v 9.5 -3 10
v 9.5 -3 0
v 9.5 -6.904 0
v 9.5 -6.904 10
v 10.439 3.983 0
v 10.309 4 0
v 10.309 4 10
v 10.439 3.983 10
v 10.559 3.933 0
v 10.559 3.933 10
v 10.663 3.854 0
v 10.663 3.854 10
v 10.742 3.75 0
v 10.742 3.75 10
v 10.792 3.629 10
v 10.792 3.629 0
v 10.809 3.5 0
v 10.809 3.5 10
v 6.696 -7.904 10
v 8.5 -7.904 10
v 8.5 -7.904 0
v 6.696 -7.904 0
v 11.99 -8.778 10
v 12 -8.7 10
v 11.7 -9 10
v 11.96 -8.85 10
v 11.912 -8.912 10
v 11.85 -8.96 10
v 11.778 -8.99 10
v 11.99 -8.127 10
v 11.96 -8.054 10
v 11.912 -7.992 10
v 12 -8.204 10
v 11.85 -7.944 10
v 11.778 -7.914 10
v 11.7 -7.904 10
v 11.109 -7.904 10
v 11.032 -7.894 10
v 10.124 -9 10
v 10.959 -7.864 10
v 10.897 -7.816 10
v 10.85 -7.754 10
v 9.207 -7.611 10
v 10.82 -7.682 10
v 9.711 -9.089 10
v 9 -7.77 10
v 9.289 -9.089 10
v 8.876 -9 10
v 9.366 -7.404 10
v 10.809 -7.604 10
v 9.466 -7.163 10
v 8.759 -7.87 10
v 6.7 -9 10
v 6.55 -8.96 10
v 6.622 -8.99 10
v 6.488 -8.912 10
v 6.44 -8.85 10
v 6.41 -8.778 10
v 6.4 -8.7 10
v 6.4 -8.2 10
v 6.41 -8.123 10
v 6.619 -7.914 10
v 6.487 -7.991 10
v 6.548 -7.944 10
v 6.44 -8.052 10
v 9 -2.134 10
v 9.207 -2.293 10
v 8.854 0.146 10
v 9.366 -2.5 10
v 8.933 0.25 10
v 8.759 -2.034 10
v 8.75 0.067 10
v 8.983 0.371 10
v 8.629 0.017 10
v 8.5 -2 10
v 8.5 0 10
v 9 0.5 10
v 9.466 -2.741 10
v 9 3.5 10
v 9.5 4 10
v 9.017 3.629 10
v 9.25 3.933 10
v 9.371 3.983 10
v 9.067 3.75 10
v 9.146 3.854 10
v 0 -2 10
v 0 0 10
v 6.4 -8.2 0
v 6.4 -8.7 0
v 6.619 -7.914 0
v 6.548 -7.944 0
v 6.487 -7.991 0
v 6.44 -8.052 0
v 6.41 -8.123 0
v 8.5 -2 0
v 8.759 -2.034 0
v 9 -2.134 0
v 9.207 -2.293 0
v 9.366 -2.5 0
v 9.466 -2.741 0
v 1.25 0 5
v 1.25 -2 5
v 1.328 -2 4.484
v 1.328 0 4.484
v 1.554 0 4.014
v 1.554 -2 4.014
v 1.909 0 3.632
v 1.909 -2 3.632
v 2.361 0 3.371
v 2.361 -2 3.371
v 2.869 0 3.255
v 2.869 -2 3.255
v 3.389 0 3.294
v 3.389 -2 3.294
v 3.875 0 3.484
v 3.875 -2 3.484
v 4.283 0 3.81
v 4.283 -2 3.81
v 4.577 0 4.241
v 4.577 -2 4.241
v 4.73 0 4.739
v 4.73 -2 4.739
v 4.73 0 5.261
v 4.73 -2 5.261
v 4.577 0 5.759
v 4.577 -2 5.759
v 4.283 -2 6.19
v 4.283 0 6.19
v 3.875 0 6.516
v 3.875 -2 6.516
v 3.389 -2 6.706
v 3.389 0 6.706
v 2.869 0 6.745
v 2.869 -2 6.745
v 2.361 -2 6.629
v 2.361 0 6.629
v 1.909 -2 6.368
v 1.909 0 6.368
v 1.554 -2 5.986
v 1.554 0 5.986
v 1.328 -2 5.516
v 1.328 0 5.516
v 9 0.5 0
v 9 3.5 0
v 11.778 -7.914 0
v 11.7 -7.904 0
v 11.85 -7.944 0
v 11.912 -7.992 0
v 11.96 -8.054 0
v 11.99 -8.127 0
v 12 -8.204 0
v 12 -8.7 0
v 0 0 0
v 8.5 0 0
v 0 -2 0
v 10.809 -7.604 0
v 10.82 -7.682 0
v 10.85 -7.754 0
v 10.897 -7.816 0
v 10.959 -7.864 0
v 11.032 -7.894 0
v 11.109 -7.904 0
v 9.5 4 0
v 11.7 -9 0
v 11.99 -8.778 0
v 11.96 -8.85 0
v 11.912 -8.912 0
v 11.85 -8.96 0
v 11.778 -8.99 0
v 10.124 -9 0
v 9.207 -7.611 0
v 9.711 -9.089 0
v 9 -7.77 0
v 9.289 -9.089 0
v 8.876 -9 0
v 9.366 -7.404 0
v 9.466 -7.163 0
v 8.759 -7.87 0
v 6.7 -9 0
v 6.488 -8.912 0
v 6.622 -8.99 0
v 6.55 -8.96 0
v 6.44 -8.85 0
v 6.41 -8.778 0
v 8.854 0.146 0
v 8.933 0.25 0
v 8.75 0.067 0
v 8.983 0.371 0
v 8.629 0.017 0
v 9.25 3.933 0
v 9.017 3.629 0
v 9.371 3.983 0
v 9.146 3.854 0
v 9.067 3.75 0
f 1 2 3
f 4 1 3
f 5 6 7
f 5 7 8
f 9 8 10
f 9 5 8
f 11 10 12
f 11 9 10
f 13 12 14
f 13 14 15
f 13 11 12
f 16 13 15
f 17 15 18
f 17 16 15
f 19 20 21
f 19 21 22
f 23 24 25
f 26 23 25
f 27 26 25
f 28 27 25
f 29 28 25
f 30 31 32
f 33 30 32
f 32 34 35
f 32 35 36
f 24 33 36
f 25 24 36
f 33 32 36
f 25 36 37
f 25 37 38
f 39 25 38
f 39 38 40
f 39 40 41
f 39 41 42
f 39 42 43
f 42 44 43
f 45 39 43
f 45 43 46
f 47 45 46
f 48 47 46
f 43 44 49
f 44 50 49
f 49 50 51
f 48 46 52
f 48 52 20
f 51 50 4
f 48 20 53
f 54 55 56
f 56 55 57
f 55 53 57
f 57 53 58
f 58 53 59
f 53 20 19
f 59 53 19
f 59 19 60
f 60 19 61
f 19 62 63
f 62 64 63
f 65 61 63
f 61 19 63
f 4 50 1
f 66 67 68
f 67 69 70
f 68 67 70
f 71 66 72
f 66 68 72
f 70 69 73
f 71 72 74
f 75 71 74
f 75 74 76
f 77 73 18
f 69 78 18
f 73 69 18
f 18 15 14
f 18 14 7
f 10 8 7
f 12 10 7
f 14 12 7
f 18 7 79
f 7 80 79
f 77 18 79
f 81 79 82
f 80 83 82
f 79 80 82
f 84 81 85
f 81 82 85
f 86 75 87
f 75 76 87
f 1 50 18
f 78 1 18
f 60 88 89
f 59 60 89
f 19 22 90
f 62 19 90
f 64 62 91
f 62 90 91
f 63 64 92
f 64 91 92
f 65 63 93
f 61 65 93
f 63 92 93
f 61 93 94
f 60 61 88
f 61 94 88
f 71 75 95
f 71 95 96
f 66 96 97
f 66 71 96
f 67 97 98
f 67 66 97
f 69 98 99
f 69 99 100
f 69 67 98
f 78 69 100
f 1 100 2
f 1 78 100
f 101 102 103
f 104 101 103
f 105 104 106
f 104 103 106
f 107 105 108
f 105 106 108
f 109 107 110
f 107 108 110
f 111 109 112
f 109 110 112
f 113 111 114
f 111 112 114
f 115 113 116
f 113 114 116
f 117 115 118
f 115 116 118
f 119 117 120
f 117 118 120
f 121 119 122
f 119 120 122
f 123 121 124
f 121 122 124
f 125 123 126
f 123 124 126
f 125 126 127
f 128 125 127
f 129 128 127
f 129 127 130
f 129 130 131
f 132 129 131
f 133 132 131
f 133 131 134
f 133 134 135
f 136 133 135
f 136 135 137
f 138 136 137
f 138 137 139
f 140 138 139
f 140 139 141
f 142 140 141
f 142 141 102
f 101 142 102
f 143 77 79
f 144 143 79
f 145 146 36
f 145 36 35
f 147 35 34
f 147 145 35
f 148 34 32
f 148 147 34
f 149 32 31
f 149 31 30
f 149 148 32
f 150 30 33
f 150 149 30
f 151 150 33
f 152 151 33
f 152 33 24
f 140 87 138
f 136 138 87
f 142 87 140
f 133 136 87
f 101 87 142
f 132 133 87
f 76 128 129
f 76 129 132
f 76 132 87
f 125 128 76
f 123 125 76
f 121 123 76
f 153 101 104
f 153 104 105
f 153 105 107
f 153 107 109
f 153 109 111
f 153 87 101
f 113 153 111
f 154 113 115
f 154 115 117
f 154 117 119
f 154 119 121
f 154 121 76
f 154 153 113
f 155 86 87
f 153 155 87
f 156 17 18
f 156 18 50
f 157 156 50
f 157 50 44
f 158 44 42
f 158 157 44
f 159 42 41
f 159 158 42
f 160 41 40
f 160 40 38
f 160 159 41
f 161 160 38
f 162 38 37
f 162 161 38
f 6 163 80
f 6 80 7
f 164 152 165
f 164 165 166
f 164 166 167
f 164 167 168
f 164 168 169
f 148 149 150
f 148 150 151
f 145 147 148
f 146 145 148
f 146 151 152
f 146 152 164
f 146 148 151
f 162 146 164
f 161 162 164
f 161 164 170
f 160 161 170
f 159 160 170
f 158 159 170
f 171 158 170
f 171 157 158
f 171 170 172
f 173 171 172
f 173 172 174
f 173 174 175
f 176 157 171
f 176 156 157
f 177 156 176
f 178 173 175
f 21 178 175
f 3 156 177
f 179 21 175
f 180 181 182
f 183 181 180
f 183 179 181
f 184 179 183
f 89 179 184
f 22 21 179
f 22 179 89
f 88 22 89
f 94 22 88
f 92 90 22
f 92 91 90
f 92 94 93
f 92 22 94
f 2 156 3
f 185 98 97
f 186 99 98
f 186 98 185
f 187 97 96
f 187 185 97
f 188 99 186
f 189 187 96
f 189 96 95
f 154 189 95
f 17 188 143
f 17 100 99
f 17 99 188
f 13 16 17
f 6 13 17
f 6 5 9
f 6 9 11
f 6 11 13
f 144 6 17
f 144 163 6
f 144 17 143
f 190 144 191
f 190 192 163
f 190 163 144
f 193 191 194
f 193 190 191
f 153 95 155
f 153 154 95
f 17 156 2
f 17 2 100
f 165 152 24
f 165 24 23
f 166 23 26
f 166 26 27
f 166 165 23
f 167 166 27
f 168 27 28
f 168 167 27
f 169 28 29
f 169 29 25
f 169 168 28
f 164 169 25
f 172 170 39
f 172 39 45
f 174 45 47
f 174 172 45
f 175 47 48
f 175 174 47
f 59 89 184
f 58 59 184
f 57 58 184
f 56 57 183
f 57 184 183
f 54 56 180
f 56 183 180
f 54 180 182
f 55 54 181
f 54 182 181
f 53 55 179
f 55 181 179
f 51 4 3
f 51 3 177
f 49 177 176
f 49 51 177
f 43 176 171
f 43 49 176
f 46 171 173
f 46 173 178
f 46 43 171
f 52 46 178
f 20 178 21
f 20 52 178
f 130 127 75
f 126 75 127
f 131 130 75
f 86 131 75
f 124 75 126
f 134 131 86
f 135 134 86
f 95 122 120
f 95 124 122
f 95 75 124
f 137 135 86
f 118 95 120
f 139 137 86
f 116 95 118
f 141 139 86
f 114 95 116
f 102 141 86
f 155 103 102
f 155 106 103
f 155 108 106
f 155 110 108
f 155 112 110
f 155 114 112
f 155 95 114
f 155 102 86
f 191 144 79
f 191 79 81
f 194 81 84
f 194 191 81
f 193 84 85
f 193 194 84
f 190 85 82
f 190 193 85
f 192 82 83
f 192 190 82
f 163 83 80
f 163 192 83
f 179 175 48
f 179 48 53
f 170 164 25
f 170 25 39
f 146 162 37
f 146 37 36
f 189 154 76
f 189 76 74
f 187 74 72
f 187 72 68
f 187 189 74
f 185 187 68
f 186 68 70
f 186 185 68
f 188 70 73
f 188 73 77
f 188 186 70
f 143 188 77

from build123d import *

# Parameters (mm, degrees)
BOSS_EXTRUDE1_DEPTH  = 10
M3_CLEARANCE_HOLE1_D = 3.5
CUT_EXTRUDE1_DEPTH   = 10
CUT_EXTRUDE2_START   = -10
CUT_EXTRUDE2_DEPTH   = 10


with BuildPart() as part:
    # Sketch1 → Boss-Extrude1 (new body)
    with BuildSketch(Plane.XY):
        with BuildLine():
            Line((0, 0), (8, 0))
            Line((8, 0), (8.5, 0))
            ThreePointArc((8.5, 0), (8.853553391, 0.146446609), (9, 0.5))
            Line((9, 0.5), (9, 3.5))
            ThreePointArc((9, 3.5), (9.146446609, 3.853553391), (9.5, 4))
            Line((9.5, 4), (10.309420257, 4))
            ThreePointArc((10.309420257, 4), (10.662973647, 3.853553391), (10.809420257, 3.5))
            Line((10.809420257, 3.5), (10.809420257, -7.604196011))
            ThreePointArc((10.809420257, -7.604196011), (10.897288222, -7.816328045), (11.109420257, -7.904196011))
            Line((11.109420257, -7.904196011), (11.7, -7.904196011))
            ThreePointArc((11.7, -7.904196011), (11.912132034, -7.992063976), (12, -8.204196011))
            Line((12, -8.204196011), (12, -8.7))
            ThreePointArc((12, -8.7), (11.912132034, -8.912132034), (11.7, -9))
            Line((11.7, -9), (10.1244998, -9))
            ThreePointArc((10.1244998, -9), (9.5, -9.1), (8.8755002, -9))
            Line((8.8755002, -9), (6.3, -9))
            ThreePointArc((6.3, -9), (6.087867966, -8.912132034), (6, -8.7))
            Line((6, -8.7), (6, -8.2))
            ThreePointArc((6, -8.2), (6.070871215, -8.006350833), (6.25, -7.904196011))
            ThreePointArc((6.25, -7.904196011), (6.429128785, -7.802041189), (6.5, -7.608392022))
            Line((6.5, -7.608392022), (6.5, -2.2))
            ThreePointArc((6.5, -2.2), (6.441421356, -2.058578644), (6.3, -2))
            Line((6.3, -2), (0, -2))
            Line((0, -2), (0, 0))
        make_face()
    extrude(amount=BOSS_EXTRUDE1_DEPTH)

    # M3 Clearance Hole1 (through all)
    with Locations(Plane(origin=(0, 0, 0), x_dir=(1, 0, 0), z_dir=(0, 1, 0))):
        with Locations((3, -5)):
            Hole(M3_CLEARANCE_HOLE1_D / 2)

    # Sketch4 → Cut-Extrude1 (cut)
    with BuildSketch(Plane.XY.offset(10)):
        with BuildLine():
            Line((5.764081335, -2), (8.5, -2))
            ThreePointArc((8.5, -2), (9.207106781, -2.292893219), (9.5, -3))
            Line((9.5, -3), (9.5, -6.904196011))
            ThreePointArc((9.5, -6.904196011), (9.207106781, -7.611302792), (8.5, -7.904196011))
            Line((8.5, -7.904196011), (5.764081335, -7.904196011))
            Line((5.764081335, -7.904196011), (5.764081335, -2))
        make_face()
    extrude(amount=-CUT_EXTRUDE1_DEPTH, mode=Mode.SUBTRACT)

    # Sketch6 → Cut-Extrude2 (cut)
    with BuildSketch(Plane.XY.offset(10).offset(CUT_EXTRUDE2_START)):
        with BuildLine():
            Line((6.4, -8.2), (6.4, -8.7))
            ThreePointArc((6.4, -8.7), (6.487867966, -8.912132034), (6.7, -9))
            Line((6.7, -9), (6.3, -9))
            ThreePointArc((6.3, -9), (6.087867966, -8.912132034), (6, -8.7))
            Line((6, -8.7), (6, -8.2))
            ThreePointArc((6, -8.2), (6.070871215, -8.006350833), (6.25, -7.904196011))
            Line((6.25, -7.904196011), (6.695803989, -7.904196011))
            ThreePointArc((6.695803989, -7.904196011), (6.486638983, -7.990834993), (6.4, -8.2))
        make_face()
    extrude(amount=CUT_EXTRUDE2_DEPTH, mode=Mode.SUBTRACT)


solid = part.part
